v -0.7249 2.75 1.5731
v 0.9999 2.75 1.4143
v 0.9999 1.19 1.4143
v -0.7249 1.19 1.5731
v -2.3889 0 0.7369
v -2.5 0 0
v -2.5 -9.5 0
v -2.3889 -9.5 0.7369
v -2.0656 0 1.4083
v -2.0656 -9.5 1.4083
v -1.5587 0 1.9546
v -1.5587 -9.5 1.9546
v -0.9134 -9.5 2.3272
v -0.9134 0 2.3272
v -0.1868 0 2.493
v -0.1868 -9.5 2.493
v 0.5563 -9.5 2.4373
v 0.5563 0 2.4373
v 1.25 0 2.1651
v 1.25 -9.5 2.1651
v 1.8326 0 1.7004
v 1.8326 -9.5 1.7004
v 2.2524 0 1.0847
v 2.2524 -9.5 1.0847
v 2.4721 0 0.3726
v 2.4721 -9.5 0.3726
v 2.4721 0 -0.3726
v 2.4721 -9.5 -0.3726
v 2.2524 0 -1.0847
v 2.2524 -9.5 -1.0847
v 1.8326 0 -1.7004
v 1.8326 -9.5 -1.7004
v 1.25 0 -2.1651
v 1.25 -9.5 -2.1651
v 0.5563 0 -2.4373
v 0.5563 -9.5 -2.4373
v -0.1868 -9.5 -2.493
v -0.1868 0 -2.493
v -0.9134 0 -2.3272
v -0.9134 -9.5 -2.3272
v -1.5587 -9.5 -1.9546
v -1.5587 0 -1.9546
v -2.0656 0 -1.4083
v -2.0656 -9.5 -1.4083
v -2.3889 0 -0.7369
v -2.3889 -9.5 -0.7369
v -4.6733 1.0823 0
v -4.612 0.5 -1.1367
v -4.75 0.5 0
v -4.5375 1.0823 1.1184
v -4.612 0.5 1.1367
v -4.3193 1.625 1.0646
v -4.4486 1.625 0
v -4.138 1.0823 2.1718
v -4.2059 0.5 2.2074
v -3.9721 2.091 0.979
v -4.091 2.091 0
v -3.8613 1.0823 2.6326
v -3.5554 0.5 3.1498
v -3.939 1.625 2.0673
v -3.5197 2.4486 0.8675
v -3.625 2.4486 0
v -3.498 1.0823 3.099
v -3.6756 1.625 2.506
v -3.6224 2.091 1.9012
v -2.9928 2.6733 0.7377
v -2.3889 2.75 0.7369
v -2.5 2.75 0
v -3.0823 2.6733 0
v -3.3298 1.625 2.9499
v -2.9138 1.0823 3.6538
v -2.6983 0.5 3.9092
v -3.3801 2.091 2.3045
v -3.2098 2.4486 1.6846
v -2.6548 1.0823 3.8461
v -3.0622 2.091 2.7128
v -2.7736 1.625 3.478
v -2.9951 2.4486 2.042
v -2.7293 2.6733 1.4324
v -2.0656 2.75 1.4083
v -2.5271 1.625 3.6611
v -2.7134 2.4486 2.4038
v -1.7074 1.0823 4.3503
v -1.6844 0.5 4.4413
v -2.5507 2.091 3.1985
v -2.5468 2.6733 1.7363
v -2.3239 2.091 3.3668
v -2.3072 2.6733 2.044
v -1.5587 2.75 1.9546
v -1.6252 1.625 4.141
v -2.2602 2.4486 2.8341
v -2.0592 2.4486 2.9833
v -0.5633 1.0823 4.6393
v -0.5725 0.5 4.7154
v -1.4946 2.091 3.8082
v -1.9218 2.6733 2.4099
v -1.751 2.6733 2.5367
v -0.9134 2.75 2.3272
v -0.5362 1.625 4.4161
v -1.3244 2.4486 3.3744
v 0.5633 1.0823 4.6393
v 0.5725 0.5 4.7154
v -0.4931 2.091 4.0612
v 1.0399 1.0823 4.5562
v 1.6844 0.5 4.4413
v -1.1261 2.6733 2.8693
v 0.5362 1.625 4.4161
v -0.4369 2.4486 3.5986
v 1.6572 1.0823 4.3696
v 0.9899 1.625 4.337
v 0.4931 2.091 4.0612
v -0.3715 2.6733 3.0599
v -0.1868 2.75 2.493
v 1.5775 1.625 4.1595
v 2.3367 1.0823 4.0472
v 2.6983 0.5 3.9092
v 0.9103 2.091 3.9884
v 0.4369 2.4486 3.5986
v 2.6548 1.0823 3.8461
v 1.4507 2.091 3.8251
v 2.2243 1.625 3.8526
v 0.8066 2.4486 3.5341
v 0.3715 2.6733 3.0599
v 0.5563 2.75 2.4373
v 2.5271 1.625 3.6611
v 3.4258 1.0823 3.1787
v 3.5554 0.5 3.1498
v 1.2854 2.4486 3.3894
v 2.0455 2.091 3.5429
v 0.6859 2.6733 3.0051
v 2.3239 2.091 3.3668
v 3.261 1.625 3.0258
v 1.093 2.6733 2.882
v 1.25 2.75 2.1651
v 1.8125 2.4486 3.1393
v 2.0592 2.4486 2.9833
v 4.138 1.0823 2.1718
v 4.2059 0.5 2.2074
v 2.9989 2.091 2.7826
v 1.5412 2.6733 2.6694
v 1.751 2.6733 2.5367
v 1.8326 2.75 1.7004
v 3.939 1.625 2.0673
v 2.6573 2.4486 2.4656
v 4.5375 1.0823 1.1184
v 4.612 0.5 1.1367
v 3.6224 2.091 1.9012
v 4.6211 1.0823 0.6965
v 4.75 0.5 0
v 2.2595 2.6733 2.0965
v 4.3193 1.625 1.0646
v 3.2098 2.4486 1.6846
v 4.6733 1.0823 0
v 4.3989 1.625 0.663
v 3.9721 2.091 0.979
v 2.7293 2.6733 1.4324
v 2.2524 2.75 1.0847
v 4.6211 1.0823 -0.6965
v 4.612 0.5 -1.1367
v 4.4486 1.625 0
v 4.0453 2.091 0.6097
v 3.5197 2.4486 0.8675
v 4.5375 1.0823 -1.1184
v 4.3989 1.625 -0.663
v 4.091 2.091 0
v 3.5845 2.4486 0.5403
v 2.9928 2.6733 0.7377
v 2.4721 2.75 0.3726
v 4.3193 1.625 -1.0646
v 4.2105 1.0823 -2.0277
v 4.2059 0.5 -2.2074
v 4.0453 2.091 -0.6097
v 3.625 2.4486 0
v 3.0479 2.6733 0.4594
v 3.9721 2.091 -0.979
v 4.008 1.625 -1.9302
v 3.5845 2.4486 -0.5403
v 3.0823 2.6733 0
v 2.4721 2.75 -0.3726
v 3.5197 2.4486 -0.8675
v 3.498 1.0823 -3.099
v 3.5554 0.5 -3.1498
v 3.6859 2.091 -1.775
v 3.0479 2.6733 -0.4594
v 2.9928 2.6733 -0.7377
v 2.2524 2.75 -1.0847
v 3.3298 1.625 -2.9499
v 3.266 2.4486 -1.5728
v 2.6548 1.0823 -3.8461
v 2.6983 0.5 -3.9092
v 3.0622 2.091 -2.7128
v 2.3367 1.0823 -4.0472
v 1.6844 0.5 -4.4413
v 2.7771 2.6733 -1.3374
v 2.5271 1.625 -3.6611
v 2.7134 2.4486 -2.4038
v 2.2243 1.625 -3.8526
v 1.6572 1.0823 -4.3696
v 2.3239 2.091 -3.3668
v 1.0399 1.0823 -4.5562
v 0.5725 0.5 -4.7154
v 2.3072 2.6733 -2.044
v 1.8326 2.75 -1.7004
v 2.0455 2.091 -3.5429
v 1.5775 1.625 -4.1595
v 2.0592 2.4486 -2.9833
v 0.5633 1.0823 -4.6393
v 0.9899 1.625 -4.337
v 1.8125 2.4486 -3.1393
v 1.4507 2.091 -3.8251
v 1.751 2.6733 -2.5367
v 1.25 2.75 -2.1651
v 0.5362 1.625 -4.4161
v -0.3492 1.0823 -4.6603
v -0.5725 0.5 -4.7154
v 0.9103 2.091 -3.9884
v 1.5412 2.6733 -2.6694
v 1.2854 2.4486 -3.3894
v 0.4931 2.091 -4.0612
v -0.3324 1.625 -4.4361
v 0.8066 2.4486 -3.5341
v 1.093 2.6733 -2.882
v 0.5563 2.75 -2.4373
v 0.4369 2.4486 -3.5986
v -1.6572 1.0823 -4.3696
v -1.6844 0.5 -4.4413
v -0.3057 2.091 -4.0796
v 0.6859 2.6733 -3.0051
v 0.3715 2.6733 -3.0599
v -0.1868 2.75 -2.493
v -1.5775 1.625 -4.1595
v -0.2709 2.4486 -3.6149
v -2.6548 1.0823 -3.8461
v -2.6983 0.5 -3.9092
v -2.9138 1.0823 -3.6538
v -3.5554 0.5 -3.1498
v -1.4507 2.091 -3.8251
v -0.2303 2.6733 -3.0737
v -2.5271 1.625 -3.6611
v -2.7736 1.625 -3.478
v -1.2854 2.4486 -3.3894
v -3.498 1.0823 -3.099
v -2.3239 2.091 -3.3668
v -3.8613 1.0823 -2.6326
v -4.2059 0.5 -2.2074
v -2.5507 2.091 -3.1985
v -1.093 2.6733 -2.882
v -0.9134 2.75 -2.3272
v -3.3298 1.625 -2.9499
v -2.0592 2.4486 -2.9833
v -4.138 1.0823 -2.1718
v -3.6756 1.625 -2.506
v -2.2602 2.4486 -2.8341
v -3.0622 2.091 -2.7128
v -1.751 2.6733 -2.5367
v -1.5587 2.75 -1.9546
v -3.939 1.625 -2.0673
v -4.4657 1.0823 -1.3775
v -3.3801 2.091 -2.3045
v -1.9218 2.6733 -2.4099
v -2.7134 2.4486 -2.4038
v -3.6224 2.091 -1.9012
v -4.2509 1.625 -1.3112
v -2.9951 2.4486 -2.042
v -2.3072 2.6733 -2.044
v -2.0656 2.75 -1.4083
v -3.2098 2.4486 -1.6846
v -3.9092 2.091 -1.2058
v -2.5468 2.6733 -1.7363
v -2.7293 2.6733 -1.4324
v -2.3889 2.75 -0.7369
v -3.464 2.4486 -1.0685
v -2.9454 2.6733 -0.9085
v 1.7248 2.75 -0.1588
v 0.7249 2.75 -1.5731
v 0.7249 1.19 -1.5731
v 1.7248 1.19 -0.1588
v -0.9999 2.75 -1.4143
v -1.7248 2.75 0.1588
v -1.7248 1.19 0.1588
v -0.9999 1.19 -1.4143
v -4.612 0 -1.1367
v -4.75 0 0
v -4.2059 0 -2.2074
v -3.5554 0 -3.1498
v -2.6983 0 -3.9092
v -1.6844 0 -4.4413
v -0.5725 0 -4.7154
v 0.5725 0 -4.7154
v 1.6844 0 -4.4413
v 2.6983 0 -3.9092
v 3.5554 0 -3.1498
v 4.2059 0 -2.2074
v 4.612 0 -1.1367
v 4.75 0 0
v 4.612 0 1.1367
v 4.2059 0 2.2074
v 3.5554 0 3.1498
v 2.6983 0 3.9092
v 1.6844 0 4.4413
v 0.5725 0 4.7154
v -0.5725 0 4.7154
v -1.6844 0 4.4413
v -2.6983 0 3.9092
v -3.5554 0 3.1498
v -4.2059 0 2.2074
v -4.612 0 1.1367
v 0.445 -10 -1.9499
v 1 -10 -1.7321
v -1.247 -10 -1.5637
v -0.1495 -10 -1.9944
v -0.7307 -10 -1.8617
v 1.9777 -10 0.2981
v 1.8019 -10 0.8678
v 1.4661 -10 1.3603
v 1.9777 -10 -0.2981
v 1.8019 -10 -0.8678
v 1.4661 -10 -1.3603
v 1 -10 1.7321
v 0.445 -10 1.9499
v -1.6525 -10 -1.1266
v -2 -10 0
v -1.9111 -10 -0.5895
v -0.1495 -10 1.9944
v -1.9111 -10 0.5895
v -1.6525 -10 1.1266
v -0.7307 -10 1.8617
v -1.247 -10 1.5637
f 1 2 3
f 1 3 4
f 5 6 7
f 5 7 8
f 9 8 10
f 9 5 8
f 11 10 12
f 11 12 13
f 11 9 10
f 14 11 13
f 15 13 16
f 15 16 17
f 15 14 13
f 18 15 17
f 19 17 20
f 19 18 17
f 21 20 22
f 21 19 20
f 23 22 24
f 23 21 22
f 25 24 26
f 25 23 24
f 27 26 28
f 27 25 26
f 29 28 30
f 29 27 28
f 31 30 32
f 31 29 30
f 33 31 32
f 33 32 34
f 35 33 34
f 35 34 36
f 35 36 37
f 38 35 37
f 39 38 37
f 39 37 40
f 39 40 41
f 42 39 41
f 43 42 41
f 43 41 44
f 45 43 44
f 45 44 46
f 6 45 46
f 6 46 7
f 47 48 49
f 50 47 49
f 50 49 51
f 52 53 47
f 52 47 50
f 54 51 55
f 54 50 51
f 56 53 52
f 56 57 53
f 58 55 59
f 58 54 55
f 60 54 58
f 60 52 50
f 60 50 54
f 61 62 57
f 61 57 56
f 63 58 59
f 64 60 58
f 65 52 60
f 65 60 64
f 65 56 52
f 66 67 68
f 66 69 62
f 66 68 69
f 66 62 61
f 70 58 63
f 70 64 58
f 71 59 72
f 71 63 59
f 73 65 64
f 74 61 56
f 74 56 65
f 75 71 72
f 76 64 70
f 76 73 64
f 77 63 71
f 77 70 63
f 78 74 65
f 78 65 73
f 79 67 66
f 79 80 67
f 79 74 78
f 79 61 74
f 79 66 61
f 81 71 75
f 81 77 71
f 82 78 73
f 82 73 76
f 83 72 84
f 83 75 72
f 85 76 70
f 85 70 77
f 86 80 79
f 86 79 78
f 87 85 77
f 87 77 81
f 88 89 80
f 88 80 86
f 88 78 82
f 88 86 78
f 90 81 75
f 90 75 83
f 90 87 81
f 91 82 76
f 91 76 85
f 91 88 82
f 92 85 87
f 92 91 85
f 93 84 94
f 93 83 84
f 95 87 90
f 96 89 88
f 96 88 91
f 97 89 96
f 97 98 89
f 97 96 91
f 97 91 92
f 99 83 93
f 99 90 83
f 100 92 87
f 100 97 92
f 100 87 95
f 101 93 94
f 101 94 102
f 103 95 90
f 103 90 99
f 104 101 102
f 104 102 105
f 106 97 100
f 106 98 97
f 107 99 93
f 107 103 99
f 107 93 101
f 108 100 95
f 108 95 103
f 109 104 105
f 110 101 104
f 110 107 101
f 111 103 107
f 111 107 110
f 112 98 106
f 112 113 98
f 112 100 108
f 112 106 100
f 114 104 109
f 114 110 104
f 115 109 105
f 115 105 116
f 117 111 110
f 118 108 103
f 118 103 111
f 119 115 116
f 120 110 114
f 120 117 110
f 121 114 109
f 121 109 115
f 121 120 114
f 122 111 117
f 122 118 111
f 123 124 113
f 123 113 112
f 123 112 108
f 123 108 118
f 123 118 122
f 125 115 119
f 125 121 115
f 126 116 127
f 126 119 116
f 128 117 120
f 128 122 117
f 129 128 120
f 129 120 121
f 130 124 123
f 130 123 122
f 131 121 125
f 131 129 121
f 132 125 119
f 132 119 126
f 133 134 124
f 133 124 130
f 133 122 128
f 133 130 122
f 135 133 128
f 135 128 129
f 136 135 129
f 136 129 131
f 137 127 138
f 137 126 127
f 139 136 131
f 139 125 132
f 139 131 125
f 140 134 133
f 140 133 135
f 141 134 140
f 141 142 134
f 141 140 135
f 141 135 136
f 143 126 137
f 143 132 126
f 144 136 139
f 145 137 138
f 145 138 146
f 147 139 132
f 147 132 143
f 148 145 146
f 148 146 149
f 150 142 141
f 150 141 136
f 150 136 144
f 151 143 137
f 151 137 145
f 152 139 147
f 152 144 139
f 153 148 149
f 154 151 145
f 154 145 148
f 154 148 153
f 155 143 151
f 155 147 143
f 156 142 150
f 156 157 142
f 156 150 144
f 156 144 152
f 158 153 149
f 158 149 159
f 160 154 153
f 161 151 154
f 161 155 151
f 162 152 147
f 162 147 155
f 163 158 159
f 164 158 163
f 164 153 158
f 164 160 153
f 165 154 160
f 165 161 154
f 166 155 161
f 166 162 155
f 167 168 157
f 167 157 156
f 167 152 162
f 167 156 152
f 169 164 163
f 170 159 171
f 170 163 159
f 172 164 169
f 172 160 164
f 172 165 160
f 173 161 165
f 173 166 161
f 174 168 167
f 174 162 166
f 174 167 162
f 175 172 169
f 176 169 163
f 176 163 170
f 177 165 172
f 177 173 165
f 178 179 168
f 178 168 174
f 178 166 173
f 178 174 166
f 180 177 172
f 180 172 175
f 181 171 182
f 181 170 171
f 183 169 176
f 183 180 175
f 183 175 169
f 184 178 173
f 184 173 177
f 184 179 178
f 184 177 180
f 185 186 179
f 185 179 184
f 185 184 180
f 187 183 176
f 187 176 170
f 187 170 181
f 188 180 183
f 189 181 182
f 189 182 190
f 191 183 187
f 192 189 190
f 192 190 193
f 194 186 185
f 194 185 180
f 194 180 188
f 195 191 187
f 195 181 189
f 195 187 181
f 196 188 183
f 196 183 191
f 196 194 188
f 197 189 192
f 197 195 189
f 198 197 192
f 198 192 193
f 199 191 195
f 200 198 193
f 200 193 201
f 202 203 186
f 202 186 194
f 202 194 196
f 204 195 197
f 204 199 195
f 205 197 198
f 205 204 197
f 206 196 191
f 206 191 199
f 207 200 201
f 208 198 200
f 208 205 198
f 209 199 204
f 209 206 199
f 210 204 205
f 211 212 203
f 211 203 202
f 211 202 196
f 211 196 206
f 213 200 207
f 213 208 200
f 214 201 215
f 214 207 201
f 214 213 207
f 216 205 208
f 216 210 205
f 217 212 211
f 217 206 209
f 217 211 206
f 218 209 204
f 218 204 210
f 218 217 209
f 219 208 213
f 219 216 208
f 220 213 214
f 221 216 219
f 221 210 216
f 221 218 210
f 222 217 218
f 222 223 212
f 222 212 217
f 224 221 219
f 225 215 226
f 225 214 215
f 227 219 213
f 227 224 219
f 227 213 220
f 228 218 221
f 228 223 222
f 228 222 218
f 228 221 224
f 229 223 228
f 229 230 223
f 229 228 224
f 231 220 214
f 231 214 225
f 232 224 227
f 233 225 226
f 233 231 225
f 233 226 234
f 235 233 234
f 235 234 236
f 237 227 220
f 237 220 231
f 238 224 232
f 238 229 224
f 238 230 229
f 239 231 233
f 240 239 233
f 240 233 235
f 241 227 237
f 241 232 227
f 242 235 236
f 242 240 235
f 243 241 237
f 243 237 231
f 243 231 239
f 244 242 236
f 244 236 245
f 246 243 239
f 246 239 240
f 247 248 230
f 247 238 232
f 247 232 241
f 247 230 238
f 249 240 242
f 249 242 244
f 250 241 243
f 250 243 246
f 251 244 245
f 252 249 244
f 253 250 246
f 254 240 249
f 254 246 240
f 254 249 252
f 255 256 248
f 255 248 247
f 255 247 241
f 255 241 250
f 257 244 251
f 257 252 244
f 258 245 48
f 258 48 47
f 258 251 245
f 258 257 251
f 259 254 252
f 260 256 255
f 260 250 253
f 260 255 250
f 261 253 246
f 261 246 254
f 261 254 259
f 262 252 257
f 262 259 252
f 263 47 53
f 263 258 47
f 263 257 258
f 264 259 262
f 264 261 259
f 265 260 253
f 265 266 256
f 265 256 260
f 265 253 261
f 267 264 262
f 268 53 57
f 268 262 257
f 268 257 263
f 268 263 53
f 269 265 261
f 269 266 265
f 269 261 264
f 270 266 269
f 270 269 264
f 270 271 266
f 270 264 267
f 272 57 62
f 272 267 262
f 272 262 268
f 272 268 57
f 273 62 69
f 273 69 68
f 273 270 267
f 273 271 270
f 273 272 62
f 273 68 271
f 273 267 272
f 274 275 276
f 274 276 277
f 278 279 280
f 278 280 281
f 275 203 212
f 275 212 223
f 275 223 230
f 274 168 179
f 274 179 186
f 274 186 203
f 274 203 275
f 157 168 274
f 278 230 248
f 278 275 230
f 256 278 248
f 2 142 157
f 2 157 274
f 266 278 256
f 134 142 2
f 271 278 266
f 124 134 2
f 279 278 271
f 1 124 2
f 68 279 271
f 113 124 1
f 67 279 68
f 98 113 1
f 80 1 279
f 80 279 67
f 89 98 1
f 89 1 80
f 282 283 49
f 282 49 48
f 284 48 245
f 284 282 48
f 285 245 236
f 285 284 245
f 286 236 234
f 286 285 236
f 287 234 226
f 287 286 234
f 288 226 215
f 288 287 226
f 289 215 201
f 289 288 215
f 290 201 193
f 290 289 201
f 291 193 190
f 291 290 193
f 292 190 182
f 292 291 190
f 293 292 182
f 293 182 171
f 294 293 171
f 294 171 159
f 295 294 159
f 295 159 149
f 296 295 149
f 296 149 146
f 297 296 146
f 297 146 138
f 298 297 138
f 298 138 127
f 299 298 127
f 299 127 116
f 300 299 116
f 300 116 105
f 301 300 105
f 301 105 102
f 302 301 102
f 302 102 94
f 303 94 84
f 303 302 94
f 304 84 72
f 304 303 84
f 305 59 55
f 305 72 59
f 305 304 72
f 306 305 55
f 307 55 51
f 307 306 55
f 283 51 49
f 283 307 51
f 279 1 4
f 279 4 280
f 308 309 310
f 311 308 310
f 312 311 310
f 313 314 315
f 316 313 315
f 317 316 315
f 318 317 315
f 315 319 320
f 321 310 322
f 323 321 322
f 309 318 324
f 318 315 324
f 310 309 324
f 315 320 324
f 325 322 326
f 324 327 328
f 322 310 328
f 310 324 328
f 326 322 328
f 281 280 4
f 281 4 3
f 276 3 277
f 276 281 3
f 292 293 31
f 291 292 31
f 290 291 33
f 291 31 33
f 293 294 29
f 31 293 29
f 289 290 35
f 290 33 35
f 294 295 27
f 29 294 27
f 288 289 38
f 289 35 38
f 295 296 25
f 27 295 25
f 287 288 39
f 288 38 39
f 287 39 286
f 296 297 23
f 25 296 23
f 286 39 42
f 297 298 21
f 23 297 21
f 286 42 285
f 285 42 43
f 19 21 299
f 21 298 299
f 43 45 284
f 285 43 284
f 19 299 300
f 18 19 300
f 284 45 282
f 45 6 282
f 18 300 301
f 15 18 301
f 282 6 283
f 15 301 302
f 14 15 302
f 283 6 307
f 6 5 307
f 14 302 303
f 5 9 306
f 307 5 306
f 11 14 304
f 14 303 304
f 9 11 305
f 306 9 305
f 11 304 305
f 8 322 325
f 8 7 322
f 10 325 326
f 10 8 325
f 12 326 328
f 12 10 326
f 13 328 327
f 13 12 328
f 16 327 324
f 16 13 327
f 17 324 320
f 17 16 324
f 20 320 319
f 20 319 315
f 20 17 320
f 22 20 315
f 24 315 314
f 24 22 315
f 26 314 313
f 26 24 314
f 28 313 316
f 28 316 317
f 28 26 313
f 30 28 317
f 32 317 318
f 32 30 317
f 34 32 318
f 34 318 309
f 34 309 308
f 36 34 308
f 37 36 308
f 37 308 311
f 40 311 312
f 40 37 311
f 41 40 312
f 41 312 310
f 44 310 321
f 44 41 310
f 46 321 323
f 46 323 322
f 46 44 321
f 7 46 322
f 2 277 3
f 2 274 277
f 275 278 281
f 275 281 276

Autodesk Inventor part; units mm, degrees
ref_plane "YZ Plane" through (0, 0, 0) normal (1, 0, 0) x (0, 1, 0)
ref_plane "XZ Plane" through (0, 0, 0) normal (0, 1, 0) x (-1, 0, 0)
ref_plane "XY Plane" through (0, 0, 0) normal (0, 0, 1) x (1, 0, 0)
sketch "Boceto1" plane through (0, 0, 0) normal (0, 1, 0) x (-1, 0, 0)
  circle A0 centre (0, 0) radius 2.5
  circle A1 centre (0, 0) radius 4.75
  dimension "d0" = 5
  dimension "d1" = 9.5
extrude "Extrusión1" add sketch "Boceto1" along normal blind 2.75 contours A0 | A1
extrude "Extrusión2" add sketch "Boceto1" against normal blind 10 contours A0
thread "Rosca1" size "M5x0.8" class "6g" standard "ISO Metric profile" length 100
fillet "Empalme1" radius 2.25 1 edges at (4.75, 2.75, 0)
sketch "Boceto2" plane through (0, 2.75, 0) normal (0, 1, 0) x (1, 0, 0)
  line L0 (0.7249, 1.5731) -> (1.7248, 0.1588)
  line L1 (1.7248, 0.1588) -> (0.9999, -1.4143)
  line L2 (0.9999, -1.4143) -> (-0.7249, -1.5731)
  line L3 (-0.7249, -1.5731) -> (-1.7248, -0.1588)
  line L4 (-1.7248, -0.1588) -> (-0.9999, 1.4143)
  line L5 (-0.9999, 1.4143) -> (0.7249, 1.5731)
  point P0 (0, 0)
  point P1 (0, 0)
  dimension "d9" = 3
extrude "Extrusión3" cut sketch "Boceto2" against normal blind 1.56
chamfer "Chaflán1" distance 0.5 angle 45 1 edges at (2.5, -10, 0)
properties part number "Tornillo allen cabeza boton M5"
